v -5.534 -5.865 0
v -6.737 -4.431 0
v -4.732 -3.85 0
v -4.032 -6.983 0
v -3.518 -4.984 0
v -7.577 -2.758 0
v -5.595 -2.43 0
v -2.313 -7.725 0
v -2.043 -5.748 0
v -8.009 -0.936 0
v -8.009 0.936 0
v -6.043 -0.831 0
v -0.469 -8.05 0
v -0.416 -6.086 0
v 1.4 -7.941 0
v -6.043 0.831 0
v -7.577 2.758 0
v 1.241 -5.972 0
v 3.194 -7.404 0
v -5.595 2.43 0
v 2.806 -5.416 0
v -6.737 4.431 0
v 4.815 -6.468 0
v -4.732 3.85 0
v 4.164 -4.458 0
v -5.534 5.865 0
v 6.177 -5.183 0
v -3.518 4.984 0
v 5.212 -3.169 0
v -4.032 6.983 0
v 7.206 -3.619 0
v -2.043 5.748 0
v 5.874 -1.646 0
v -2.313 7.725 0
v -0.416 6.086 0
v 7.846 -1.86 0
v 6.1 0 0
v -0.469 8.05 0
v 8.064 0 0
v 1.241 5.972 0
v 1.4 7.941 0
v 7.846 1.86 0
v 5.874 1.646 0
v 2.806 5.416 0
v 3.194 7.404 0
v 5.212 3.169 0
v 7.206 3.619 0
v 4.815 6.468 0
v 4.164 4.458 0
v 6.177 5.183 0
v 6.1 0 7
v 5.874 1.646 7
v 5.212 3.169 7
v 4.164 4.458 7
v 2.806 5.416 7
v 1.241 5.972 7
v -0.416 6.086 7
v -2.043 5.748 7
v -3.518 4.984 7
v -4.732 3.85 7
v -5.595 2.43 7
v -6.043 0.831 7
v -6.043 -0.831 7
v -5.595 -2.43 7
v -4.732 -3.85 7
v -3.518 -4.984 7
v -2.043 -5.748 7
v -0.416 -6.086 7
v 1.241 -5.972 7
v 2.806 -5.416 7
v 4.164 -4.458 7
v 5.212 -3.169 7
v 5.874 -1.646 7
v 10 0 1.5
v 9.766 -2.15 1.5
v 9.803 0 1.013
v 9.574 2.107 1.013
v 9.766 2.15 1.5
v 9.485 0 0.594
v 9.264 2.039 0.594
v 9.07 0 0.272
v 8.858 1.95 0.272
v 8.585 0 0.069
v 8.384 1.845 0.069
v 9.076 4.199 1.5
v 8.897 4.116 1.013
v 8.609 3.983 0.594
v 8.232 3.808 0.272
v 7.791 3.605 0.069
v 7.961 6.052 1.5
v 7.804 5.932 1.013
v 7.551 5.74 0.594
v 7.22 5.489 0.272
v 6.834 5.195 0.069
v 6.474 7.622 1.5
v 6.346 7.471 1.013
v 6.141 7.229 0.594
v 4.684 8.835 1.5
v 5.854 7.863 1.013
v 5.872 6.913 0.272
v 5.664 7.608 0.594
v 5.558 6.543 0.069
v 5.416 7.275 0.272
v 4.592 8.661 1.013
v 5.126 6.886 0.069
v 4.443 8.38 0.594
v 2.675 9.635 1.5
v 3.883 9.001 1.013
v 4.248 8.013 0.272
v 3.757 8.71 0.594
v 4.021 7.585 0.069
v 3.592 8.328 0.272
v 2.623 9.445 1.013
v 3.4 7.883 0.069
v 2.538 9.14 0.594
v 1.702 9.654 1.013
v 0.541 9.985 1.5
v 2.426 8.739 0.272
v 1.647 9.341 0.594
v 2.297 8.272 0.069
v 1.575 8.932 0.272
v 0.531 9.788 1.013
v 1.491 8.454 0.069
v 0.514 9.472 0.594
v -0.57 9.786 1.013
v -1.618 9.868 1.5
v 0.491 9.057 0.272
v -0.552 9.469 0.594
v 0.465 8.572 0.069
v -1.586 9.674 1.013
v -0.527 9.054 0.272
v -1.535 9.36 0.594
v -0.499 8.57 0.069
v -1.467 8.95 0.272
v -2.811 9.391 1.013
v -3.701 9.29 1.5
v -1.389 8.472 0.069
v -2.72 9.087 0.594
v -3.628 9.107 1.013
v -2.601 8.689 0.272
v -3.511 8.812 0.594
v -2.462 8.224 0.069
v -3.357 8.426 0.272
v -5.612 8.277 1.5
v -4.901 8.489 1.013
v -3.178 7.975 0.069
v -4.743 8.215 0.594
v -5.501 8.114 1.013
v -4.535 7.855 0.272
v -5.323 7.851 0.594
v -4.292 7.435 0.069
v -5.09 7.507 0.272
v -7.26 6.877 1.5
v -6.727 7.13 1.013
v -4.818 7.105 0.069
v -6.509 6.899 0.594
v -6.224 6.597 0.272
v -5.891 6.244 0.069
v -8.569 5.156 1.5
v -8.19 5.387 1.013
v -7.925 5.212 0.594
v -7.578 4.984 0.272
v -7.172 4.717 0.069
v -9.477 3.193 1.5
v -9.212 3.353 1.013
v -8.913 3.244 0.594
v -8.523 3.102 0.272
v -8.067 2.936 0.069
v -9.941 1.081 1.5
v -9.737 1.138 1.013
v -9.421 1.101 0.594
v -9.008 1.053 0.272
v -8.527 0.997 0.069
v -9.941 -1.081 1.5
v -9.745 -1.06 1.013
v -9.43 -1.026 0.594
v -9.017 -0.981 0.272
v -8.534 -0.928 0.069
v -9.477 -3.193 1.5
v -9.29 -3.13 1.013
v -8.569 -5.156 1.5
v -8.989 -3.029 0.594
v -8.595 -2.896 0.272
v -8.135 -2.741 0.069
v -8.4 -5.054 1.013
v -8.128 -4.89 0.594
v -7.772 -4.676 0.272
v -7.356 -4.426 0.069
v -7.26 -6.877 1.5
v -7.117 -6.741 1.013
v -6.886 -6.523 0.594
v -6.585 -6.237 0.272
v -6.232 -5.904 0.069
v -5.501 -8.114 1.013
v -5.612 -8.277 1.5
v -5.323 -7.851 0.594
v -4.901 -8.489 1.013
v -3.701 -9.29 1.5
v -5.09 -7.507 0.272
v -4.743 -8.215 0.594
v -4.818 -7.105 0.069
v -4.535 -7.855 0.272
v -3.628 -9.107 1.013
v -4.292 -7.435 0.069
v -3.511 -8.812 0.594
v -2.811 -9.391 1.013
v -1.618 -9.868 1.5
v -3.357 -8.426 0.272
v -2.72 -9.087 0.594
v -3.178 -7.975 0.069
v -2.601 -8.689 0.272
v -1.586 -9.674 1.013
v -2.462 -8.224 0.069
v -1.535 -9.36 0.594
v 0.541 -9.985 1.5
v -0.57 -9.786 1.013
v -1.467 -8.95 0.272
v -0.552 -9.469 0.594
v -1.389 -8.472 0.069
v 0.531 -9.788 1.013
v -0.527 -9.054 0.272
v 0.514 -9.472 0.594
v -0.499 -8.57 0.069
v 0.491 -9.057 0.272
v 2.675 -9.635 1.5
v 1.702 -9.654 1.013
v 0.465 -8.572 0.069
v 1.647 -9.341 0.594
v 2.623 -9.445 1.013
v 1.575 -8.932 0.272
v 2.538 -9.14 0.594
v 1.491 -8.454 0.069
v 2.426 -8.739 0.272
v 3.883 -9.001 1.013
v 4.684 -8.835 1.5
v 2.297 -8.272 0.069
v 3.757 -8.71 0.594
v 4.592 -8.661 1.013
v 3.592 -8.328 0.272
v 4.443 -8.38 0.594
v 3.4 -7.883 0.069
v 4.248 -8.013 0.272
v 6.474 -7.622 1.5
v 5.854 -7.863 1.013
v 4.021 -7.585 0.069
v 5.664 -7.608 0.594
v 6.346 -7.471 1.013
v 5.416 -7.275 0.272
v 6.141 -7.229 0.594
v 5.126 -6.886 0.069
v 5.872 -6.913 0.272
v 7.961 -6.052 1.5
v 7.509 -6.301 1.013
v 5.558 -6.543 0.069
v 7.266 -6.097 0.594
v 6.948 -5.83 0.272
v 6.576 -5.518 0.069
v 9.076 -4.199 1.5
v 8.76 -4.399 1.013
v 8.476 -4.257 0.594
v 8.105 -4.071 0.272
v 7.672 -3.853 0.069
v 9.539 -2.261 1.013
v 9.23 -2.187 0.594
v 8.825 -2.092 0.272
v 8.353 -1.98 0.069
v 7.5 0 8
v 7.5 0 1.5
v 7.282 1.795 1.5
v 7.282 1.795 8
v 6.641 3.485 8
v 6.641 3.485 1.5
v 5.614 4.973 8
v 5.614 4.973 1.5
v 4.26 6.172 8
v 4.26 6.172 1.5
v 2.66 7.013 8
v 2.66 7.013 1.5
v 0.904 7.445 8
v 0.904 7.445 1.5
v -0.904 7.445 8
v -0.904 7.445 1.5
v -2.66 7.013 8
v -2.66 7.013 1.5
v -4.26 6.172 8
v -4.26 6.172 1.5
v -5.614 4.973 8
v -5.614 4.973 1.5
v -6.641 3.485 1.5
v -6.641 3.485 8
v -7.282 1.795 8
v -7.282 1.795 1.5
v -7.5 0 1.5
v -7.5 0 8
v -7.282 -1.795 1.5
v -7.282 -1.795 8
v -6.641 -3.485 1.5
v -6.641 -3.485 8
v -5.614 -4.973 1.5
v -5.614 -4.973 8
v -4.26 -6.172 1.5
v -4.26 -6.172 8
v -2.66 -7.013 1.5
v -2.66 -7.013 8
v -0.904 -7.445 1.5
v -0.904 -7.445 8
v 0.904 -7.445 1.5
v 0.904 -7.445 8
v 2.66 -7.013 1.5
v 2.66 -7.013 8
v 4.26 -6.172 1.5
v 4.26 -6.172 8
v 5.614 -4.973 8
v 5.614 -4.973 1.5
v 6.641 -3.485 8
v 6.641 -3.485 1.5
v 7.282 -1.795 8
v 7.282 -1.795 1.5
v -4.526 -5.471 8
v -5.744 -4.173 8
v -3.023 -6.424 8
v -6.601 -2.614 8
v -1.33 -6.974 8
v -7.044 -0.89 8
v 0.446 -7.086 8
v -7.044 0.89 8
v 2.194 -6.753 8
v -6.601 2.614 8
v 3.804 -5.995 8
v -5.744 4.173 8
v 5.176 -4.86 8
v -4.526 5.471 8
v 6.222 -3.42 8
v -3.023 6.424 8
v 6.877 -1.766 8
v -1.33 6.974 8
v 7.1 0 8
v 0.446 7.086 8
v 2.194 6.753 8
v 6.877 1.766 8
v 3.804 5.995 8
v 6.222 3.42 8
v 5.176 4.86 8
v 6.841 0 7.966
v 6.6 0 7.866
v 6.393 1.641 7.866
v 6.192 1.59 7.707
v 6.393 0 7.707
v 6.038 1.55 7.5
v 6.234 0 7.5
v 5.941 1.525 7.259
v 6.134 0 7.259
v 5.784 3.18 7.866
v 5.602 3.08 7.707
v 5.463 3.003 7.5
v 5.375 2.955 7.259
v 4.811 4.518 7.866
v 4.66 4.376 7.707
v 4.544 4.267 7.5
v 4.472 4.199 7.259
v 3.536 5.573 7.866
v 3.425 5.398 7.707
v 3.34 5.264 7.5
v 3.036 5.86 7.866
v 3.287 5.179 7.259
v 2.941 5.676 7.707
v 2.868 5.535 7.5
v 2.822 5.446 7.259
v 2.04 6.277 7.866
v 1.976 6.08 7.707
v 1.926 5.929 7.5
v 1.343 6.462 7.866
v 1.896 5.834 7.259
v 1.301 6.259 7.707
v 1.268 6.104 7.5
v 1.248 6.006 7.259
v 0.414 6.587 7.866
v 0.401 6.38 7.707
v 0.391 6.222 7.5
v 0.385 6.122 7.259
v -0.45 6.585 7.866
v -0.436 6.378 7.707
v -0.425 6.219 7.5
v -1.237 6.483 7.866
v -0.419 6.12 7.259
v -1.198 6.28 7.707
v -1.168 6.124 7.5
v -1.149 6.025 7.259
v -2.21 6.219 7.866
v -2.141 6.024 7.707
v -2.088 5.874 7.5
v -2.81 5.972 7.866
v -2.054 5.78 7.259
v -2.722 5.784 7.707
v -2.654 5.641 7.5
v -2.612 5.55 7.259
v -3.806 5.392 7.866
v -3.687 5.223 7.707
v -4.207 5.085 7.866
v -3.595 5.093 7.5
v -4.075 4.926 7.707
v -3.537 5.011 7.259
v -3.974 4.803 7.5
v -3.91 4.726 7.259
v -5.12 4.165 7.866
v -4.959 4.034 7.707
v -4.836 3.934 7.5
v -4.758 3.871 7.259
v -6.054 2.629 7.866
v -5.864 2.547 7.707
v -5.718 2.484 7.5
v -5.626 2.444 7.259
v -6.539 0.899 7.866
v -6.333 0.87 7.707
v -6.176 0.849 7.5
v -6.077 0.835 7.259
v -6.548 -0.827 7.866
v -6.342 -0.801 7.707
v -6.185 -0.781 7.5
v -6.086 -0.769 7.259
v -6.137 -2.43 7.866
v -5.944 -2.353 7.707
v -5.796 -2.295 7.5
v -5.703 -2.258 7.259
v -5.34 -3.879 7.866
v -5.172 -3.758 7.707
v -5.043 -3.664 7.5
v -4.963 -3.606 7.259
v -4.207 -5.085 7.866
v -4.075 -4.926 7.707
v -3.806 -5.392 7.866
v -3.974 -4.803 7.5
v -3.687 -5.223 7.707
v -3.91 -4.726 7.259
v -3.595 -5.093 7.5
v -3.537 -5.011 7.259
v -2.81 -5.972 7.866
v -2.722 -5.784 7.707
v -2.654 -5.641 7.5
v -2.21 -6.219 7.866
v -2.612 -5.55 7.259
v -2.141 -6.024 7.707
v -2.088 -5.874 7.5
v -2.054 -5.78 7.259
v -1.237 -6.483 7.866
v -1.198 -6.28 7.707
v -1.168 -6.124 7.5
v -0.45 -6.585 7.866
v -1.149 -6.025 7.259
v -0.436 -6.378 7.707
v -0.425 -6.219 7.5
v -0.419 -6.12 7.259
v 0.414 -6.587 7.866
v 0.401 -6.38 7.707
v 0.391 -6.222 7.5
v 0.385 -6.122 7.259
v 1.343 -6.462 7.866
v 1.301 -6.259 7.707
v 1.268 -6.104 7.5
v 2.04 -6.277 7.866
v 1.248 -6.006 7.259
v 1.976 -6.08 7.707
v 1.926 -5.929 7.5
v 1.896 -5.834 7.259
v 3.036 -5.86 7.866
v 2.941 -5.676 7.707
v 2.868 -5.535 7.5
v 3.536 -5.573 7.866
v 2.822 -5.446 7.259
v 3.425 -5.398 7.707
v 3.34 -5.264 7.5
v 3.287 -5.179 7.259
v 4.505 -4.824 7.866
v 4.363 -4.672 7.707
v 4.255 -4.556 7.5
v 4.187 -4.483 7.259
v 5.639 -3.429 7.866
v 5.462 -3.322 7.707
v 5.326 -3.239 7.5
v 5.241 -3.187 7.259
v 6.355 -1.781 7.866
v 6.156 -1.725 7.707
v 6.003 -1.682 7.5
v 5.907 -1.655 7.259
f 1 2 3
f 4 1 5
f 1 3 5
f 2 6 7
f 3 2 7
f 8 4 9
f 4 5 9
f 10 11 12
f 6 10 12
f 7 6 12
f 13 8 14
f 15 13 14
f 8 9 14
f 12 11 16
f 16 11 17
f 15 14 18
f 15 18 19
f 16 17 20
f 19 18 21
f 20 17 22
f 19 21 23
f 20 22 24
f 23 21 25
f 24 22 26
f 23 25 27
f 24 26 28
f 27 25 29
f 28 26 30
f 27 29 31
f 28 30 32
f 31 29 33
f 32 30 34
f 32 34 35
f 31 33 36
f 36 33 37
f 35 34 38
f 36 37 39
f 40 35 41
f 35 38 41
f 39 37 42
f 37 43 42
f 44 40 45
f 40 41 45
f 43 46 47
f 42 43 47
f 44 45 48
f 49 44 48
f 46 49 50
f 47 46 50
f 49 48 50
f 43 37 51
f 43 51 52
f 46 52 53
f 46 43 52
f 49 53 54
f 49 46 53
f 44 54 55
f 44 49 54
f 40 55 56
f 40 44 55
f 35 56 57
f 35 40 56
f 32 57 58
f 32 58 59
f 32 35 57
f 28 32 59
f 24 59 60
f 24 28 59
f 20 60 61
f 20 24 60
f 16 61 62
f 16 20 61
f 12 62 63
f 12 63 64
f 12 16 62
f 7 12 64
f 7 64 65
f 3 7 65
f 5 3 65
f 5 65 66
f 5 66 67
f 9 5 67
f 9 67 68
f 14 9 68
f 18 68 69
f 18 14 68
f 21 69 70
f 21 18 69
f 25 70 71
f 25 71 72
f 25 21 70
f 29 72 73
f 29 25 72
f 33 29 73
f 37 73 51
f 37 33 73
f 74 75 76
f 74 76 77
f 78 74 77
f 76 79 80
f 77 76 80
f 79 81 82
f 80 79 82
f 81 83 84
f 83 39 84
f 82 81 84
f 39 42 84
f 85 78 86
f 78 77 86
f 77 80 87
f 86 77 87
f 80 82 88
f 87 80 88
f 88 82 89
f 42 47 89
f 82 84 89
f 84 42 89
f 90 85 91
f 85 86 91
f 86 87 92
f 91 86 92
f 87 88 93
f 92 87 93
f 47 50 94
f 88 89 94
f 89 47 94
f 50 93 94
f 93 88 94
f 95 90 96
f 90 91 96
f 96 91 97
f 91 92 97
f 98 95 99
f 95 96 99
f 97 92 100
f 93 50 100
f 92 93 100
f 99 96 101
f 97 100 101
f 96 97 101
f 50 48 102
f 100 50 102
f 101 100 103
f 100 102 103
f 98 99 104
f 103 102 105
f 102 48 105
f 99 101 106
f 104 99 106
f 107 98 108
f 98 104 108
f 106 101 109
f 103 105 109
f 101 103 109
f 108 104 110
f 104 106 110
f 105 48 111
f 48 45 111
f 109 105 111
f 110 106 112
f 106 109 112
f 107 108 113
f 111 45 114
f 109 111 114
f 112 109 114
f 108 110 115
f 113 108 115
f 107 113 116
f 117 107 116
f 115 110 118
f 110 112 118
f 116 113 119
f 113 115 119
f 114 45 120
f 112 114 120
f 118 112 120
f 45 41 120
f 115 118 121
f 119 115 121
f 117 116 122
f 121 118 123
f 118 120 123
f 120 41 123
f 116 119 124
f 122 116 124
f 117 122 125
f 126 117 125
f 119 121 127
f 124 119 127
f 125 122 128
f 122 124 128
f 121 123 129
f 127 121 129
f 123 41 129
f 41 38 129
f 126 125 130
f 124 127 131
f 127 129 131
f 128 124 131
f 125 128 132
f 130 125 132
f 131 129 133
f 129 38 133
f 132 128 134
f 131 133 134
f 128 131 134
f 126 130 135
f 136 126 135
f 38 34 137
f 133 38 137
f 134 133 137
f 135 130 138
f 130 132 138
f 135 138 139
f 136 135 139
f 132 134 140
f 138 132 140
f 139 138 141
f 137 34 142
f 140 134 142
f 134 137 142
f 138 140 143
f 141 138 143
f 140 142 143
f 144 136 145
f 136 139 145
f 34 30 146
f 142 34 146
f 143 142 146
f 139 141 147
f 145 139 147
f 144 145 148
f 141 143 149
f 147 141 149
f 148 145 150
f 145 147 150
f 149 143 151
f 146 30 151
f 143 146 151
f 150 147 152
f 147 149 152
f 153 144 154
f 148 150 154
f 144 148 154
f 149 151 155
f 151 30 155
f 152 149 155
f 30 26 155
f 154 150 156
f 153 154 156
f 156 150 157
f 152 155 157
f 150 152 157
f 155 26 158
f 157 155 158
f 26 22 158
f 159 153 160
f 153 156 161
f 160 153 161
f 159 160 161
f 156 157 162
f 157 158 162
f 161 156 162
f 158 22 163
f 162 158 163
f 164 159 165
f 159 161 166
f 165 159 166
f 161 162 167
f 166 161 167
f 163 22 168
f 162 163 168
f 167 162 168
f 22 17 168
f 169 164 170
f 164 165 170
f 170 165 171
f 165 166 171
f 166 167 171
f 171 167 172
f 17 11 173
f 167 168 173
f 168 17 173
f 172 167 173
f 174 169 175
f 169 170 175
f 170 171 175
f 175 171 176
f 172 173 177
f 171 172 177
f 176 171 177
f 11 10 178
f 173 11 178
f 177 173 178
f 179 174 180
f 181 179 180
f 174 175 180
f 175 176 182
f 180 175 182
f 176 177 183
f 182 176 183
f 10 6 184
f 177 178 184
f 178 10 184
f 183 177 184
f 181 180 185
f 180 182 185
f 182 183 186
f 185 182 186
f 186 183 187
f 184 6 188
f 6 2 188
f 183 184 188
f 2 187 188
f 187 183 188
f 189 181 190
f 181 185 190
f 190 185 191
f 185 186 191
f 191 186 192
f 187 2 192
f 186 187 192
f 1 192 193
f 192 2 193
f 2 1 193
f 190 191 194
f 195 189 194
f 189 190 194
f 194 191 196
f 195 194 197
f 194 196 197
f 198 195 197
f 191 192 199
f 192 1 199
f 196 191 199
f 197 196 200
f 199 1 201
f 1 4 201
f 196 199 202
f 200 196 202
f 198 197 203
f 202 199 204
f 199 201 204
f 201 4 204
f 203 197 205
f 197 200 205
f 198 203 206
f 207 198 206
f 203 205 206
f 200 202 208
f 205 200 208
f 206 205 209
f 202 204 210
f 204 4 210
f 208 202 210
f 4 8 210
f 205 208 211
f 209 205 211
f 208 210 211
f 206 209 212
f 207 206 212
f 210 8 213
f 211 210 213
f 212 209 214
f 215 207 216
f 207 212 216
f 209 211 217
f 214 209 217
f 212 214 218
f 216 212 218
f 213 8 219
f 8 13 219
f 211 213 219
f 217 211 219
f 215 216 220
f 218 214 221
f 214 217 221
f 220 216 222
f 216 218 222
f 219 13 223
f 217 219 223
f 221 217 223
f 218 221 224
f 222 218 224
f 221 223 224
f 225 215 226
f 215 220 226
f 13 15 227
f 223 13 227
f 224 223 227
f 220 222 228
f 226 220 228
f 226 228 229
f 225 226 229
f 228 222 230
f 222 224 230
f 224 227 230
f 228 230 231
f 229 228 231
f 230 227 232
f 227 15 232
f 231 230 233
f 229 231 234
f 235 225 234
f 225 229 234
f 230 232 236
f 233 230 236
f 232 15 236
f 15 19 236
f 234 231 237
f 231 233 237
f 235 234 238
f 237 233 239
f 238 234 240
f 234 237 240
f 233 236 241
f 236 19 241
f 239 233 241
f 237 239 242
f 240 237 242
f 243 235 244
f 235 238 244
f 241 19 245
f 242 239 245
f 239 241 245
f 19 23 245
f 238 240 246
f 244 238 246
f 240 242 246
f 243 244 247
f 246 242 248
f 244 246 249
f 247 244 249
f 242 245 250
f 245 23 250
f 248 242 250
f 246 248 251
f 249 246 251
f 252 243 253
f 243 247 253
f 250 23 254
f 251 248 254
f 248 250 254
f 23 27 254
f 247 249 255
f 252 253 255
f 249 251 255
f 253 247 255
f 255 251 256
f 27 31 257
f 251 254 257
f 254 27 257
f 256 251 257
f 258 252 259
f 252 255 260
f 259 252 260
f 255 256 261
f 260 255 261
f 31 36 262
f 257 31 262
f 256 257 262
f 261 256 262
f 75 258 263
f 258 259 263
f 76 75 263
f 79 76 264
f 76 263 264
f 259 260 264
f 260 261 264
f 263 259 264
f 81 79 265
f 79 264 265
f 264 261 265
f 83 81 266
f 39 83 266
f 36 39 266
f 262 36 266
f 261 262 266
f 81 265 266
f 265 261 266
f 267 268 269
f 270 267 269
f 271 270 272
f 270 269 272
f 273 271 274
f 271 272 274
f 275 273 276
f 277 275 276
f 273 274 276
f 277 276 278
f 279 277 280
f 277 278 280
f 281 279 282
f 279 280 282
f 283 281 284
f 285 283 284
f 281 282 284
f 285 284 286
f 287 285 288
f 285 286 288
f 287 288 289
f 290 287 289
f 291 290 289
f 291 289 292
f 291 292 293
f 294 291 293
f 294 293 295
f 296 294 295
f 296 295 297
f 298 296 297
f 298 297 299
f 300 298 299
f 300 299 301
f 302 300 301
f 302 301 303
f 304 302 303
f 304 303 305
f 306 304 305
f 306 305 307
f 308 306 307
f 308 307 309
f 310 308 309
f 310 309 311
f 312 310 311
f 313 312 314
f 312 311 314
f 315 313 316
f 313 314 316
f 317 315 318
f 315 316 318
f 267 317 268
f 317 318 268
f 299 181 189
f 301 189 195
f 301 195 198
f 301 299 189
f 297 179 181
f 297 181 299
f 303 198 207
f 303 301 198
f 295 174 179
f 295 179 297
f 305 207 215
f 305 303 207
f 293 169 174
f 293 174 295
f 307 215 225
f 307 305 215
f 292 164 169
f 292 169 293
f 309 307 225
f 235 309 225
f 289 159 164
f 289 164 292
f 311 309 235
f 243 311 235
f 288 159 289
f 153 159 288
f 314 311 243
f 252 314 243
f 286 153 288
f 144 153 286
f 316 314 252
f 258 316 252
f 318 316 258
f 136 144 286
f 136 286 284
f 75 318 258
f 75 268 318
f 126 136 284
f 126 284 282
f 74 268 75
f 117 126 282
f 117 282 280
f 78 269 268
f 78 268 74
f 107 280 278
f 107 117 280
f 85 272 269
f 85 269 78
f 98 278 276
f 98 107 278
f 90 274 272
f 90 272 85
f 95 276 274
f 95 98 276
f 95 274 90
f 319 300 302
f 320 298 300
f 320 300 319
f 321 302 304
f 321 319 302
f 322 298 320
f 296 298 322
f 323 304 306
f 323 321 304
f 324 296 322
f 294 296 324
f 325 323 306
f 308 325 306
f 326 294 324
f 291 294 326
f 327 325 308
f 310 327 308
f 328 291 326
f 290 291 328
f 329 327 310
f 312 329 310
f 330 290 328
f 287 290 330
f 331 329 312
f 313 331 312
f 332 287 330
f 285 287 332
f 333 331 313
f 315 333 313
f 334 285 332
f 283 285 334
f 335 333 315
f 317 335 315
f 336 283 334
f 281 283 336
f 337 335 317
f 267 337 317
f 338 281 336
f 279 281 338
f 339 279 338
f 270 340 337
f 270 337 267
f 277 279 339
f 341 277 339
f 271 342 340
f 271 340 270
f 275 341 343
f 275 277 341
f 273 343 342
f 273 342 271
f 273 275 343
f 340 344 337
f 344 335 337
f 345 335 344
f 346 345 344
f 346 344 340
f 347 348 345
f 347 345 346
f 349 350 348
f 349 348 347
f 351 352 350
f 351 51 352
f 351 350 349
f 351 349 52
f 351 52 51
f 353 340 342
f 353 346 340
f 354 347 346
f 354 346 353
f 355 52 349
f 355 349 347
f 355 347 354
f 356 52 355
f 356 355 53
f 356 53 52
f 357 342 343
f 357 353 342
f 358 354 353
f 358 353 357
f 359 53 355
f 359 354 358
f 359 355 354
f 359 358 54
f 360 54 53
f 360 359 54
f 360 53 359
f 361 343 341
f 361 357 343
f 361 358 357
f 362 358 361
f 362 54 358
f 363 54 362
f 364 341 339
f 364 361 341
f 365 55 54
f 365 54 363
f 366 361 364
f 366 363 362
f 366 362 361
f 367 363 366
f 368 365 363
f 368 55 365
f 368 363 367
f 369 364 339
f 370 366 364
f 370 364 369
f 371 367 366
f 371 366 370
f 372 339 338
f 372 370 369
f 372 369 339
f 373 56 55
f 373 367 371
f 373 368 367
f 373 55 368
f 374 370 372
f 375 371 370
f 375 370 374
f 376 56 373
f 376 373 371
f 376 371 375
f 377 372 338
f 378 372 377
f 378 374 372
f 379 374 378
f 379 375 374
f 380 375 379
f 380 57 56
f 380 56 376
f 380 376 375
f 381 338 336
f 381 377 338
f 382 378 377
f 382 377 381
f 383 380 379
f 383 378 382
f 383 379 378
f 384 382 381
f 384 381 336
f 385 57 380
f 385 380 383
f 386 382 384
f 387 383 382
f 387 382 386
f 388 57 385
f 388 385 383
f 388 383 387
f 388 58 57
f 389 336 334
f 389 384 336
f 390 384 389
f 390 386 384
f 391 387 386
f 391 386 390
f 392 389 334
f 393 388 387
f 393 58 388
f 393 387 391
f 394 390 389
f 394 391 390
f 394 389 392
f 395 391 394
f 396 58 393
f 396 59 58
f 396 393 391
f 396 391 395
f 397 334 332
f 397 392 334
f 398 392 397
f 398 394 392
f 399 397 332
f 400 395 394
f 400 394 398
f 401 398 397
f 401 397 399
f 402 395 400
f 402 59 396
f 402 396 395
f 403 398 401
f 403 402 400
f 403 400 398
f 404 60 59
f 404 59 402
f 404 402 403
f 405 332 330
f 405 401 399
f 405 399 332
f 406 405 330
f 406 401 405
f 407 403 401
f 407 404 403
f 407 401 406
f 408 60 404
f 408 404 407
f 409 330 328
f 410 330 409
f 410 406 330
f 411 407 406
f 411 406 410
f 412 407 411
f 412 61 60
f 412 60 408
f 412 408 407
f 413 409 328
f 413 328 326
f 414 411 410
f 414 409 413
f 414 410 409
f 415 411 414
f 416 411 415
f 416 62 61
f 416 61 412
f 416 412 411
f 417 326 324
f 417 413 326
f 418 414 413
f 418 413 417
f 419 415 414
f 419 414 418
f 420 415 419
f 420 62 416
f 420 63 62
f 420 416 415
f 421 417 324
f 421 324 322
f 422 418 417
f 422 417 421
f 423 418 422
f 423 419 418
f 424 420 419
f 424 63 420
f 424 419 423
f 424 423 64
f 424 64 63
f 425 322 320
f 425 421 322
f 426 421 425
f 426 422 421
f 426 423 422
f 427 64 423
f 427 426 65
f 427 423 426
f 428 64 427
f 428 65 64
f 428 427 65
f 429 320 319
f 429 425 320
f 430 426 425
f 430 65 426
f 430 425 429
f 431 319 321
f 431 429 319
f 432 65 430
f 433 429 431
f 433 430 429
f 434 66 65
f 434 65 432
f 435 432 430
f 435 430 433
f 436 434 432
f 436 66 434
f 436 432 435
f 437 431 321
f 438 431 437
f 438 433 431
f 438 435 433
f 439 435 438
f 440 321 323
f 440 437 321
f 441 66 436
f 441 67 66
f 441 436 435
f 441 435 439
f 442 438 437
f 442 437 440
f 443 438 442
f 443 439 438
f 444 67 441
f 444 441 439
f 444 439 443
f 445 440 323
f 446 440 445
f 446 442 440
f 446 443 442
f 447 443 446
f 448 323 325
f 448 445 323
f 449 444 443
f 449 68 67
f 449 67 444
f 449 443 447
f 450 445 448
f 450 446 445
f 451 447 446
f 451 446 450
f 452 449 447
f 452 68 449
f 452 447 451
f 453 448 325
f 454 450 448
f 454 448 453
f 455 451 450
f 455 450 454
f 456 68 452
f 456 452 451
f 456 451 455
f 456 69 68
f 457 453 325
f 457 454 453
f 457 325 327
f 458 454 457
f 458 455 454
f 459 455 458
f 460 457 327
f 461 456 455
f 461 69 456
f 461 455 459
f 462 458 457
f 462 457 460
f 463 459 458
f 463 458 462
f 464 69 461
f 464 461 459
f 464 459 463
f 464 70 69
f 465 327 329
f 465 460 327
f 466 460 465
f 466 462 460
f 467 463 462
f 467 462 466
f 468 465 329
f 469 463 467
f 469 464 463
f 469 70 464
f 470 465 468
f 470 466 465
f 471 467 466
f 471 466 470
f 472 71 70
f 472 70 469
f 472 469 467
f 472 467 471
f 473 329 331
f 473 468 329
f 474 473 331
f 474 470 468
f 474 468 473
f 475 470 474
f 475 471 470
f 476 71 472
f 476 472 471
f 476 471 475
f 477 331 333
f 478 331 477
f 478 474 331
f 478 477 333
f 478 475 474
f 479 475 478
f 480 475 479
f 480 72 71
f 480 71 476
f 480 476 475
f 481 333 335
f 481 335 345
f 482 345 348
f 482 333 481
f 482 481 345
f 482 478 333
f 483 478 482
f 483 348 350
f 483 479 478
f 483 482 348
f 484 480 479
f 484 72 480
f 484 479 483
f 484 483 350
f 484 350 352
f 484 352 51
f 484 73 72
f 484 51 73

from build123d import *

# Parameters (mm, degrees)
F0_R     = 10
F0_R_2   = 7.5
F1_DEPTH = 1.5
F0_R_3   = 6.1
F2_DEPTH = 8
F4_R     = 1


# Not quite as in the source:
# - a fillet or chamfer that OpenCascade refuses, or shapes differently, is made with other operations: its cross-section is extruded or revolved along the edge and cut away or added


with BuildPart() as f1:
    # F0 (on Top) → F1 (new body)
    with BuildSketch(Plane.XY):
        Circle(F0_R)
        Circle(F0_R_2, mode=Mode.SUBTRACT)
    extrude(amount=F1_DEPTH)

    # F0 (on Top) → F2 (join)
    with BuildSketch(Plane.XY):
        Circle(F0_R_2)
        Circle(F0_R_3, mode=Mode.SUBTRACT)
    extrude(amount=F2_DEPTH)

    # F3: fillet of radius 2 on 1 edges, made by hand

    # F3_s1 → F3_t2 (revolve, cut)
    with BuildSketch(Plane.XZ):
        with BuildLine():
            ThreePointArc((10, 1.5), (9.2882531983, 0.4188611699), (8.0635083269, 0))
            Line((8.0635083269, 0), (10, 0))
            Line((10, 0), (10, 1.5))
        make_face()
    revolve(axis=Axis((0, 0, 0), (0, 0, 1)), mode=Mode.SUBTRACT)

    # F4
    f4_edges = [f1.edges().sort_by_distance(p)[0] for p in [
        (-6.1, 0, 8),
    ]]
    fillet(f4_edges, radius=F4_R)


solid = f1.part
